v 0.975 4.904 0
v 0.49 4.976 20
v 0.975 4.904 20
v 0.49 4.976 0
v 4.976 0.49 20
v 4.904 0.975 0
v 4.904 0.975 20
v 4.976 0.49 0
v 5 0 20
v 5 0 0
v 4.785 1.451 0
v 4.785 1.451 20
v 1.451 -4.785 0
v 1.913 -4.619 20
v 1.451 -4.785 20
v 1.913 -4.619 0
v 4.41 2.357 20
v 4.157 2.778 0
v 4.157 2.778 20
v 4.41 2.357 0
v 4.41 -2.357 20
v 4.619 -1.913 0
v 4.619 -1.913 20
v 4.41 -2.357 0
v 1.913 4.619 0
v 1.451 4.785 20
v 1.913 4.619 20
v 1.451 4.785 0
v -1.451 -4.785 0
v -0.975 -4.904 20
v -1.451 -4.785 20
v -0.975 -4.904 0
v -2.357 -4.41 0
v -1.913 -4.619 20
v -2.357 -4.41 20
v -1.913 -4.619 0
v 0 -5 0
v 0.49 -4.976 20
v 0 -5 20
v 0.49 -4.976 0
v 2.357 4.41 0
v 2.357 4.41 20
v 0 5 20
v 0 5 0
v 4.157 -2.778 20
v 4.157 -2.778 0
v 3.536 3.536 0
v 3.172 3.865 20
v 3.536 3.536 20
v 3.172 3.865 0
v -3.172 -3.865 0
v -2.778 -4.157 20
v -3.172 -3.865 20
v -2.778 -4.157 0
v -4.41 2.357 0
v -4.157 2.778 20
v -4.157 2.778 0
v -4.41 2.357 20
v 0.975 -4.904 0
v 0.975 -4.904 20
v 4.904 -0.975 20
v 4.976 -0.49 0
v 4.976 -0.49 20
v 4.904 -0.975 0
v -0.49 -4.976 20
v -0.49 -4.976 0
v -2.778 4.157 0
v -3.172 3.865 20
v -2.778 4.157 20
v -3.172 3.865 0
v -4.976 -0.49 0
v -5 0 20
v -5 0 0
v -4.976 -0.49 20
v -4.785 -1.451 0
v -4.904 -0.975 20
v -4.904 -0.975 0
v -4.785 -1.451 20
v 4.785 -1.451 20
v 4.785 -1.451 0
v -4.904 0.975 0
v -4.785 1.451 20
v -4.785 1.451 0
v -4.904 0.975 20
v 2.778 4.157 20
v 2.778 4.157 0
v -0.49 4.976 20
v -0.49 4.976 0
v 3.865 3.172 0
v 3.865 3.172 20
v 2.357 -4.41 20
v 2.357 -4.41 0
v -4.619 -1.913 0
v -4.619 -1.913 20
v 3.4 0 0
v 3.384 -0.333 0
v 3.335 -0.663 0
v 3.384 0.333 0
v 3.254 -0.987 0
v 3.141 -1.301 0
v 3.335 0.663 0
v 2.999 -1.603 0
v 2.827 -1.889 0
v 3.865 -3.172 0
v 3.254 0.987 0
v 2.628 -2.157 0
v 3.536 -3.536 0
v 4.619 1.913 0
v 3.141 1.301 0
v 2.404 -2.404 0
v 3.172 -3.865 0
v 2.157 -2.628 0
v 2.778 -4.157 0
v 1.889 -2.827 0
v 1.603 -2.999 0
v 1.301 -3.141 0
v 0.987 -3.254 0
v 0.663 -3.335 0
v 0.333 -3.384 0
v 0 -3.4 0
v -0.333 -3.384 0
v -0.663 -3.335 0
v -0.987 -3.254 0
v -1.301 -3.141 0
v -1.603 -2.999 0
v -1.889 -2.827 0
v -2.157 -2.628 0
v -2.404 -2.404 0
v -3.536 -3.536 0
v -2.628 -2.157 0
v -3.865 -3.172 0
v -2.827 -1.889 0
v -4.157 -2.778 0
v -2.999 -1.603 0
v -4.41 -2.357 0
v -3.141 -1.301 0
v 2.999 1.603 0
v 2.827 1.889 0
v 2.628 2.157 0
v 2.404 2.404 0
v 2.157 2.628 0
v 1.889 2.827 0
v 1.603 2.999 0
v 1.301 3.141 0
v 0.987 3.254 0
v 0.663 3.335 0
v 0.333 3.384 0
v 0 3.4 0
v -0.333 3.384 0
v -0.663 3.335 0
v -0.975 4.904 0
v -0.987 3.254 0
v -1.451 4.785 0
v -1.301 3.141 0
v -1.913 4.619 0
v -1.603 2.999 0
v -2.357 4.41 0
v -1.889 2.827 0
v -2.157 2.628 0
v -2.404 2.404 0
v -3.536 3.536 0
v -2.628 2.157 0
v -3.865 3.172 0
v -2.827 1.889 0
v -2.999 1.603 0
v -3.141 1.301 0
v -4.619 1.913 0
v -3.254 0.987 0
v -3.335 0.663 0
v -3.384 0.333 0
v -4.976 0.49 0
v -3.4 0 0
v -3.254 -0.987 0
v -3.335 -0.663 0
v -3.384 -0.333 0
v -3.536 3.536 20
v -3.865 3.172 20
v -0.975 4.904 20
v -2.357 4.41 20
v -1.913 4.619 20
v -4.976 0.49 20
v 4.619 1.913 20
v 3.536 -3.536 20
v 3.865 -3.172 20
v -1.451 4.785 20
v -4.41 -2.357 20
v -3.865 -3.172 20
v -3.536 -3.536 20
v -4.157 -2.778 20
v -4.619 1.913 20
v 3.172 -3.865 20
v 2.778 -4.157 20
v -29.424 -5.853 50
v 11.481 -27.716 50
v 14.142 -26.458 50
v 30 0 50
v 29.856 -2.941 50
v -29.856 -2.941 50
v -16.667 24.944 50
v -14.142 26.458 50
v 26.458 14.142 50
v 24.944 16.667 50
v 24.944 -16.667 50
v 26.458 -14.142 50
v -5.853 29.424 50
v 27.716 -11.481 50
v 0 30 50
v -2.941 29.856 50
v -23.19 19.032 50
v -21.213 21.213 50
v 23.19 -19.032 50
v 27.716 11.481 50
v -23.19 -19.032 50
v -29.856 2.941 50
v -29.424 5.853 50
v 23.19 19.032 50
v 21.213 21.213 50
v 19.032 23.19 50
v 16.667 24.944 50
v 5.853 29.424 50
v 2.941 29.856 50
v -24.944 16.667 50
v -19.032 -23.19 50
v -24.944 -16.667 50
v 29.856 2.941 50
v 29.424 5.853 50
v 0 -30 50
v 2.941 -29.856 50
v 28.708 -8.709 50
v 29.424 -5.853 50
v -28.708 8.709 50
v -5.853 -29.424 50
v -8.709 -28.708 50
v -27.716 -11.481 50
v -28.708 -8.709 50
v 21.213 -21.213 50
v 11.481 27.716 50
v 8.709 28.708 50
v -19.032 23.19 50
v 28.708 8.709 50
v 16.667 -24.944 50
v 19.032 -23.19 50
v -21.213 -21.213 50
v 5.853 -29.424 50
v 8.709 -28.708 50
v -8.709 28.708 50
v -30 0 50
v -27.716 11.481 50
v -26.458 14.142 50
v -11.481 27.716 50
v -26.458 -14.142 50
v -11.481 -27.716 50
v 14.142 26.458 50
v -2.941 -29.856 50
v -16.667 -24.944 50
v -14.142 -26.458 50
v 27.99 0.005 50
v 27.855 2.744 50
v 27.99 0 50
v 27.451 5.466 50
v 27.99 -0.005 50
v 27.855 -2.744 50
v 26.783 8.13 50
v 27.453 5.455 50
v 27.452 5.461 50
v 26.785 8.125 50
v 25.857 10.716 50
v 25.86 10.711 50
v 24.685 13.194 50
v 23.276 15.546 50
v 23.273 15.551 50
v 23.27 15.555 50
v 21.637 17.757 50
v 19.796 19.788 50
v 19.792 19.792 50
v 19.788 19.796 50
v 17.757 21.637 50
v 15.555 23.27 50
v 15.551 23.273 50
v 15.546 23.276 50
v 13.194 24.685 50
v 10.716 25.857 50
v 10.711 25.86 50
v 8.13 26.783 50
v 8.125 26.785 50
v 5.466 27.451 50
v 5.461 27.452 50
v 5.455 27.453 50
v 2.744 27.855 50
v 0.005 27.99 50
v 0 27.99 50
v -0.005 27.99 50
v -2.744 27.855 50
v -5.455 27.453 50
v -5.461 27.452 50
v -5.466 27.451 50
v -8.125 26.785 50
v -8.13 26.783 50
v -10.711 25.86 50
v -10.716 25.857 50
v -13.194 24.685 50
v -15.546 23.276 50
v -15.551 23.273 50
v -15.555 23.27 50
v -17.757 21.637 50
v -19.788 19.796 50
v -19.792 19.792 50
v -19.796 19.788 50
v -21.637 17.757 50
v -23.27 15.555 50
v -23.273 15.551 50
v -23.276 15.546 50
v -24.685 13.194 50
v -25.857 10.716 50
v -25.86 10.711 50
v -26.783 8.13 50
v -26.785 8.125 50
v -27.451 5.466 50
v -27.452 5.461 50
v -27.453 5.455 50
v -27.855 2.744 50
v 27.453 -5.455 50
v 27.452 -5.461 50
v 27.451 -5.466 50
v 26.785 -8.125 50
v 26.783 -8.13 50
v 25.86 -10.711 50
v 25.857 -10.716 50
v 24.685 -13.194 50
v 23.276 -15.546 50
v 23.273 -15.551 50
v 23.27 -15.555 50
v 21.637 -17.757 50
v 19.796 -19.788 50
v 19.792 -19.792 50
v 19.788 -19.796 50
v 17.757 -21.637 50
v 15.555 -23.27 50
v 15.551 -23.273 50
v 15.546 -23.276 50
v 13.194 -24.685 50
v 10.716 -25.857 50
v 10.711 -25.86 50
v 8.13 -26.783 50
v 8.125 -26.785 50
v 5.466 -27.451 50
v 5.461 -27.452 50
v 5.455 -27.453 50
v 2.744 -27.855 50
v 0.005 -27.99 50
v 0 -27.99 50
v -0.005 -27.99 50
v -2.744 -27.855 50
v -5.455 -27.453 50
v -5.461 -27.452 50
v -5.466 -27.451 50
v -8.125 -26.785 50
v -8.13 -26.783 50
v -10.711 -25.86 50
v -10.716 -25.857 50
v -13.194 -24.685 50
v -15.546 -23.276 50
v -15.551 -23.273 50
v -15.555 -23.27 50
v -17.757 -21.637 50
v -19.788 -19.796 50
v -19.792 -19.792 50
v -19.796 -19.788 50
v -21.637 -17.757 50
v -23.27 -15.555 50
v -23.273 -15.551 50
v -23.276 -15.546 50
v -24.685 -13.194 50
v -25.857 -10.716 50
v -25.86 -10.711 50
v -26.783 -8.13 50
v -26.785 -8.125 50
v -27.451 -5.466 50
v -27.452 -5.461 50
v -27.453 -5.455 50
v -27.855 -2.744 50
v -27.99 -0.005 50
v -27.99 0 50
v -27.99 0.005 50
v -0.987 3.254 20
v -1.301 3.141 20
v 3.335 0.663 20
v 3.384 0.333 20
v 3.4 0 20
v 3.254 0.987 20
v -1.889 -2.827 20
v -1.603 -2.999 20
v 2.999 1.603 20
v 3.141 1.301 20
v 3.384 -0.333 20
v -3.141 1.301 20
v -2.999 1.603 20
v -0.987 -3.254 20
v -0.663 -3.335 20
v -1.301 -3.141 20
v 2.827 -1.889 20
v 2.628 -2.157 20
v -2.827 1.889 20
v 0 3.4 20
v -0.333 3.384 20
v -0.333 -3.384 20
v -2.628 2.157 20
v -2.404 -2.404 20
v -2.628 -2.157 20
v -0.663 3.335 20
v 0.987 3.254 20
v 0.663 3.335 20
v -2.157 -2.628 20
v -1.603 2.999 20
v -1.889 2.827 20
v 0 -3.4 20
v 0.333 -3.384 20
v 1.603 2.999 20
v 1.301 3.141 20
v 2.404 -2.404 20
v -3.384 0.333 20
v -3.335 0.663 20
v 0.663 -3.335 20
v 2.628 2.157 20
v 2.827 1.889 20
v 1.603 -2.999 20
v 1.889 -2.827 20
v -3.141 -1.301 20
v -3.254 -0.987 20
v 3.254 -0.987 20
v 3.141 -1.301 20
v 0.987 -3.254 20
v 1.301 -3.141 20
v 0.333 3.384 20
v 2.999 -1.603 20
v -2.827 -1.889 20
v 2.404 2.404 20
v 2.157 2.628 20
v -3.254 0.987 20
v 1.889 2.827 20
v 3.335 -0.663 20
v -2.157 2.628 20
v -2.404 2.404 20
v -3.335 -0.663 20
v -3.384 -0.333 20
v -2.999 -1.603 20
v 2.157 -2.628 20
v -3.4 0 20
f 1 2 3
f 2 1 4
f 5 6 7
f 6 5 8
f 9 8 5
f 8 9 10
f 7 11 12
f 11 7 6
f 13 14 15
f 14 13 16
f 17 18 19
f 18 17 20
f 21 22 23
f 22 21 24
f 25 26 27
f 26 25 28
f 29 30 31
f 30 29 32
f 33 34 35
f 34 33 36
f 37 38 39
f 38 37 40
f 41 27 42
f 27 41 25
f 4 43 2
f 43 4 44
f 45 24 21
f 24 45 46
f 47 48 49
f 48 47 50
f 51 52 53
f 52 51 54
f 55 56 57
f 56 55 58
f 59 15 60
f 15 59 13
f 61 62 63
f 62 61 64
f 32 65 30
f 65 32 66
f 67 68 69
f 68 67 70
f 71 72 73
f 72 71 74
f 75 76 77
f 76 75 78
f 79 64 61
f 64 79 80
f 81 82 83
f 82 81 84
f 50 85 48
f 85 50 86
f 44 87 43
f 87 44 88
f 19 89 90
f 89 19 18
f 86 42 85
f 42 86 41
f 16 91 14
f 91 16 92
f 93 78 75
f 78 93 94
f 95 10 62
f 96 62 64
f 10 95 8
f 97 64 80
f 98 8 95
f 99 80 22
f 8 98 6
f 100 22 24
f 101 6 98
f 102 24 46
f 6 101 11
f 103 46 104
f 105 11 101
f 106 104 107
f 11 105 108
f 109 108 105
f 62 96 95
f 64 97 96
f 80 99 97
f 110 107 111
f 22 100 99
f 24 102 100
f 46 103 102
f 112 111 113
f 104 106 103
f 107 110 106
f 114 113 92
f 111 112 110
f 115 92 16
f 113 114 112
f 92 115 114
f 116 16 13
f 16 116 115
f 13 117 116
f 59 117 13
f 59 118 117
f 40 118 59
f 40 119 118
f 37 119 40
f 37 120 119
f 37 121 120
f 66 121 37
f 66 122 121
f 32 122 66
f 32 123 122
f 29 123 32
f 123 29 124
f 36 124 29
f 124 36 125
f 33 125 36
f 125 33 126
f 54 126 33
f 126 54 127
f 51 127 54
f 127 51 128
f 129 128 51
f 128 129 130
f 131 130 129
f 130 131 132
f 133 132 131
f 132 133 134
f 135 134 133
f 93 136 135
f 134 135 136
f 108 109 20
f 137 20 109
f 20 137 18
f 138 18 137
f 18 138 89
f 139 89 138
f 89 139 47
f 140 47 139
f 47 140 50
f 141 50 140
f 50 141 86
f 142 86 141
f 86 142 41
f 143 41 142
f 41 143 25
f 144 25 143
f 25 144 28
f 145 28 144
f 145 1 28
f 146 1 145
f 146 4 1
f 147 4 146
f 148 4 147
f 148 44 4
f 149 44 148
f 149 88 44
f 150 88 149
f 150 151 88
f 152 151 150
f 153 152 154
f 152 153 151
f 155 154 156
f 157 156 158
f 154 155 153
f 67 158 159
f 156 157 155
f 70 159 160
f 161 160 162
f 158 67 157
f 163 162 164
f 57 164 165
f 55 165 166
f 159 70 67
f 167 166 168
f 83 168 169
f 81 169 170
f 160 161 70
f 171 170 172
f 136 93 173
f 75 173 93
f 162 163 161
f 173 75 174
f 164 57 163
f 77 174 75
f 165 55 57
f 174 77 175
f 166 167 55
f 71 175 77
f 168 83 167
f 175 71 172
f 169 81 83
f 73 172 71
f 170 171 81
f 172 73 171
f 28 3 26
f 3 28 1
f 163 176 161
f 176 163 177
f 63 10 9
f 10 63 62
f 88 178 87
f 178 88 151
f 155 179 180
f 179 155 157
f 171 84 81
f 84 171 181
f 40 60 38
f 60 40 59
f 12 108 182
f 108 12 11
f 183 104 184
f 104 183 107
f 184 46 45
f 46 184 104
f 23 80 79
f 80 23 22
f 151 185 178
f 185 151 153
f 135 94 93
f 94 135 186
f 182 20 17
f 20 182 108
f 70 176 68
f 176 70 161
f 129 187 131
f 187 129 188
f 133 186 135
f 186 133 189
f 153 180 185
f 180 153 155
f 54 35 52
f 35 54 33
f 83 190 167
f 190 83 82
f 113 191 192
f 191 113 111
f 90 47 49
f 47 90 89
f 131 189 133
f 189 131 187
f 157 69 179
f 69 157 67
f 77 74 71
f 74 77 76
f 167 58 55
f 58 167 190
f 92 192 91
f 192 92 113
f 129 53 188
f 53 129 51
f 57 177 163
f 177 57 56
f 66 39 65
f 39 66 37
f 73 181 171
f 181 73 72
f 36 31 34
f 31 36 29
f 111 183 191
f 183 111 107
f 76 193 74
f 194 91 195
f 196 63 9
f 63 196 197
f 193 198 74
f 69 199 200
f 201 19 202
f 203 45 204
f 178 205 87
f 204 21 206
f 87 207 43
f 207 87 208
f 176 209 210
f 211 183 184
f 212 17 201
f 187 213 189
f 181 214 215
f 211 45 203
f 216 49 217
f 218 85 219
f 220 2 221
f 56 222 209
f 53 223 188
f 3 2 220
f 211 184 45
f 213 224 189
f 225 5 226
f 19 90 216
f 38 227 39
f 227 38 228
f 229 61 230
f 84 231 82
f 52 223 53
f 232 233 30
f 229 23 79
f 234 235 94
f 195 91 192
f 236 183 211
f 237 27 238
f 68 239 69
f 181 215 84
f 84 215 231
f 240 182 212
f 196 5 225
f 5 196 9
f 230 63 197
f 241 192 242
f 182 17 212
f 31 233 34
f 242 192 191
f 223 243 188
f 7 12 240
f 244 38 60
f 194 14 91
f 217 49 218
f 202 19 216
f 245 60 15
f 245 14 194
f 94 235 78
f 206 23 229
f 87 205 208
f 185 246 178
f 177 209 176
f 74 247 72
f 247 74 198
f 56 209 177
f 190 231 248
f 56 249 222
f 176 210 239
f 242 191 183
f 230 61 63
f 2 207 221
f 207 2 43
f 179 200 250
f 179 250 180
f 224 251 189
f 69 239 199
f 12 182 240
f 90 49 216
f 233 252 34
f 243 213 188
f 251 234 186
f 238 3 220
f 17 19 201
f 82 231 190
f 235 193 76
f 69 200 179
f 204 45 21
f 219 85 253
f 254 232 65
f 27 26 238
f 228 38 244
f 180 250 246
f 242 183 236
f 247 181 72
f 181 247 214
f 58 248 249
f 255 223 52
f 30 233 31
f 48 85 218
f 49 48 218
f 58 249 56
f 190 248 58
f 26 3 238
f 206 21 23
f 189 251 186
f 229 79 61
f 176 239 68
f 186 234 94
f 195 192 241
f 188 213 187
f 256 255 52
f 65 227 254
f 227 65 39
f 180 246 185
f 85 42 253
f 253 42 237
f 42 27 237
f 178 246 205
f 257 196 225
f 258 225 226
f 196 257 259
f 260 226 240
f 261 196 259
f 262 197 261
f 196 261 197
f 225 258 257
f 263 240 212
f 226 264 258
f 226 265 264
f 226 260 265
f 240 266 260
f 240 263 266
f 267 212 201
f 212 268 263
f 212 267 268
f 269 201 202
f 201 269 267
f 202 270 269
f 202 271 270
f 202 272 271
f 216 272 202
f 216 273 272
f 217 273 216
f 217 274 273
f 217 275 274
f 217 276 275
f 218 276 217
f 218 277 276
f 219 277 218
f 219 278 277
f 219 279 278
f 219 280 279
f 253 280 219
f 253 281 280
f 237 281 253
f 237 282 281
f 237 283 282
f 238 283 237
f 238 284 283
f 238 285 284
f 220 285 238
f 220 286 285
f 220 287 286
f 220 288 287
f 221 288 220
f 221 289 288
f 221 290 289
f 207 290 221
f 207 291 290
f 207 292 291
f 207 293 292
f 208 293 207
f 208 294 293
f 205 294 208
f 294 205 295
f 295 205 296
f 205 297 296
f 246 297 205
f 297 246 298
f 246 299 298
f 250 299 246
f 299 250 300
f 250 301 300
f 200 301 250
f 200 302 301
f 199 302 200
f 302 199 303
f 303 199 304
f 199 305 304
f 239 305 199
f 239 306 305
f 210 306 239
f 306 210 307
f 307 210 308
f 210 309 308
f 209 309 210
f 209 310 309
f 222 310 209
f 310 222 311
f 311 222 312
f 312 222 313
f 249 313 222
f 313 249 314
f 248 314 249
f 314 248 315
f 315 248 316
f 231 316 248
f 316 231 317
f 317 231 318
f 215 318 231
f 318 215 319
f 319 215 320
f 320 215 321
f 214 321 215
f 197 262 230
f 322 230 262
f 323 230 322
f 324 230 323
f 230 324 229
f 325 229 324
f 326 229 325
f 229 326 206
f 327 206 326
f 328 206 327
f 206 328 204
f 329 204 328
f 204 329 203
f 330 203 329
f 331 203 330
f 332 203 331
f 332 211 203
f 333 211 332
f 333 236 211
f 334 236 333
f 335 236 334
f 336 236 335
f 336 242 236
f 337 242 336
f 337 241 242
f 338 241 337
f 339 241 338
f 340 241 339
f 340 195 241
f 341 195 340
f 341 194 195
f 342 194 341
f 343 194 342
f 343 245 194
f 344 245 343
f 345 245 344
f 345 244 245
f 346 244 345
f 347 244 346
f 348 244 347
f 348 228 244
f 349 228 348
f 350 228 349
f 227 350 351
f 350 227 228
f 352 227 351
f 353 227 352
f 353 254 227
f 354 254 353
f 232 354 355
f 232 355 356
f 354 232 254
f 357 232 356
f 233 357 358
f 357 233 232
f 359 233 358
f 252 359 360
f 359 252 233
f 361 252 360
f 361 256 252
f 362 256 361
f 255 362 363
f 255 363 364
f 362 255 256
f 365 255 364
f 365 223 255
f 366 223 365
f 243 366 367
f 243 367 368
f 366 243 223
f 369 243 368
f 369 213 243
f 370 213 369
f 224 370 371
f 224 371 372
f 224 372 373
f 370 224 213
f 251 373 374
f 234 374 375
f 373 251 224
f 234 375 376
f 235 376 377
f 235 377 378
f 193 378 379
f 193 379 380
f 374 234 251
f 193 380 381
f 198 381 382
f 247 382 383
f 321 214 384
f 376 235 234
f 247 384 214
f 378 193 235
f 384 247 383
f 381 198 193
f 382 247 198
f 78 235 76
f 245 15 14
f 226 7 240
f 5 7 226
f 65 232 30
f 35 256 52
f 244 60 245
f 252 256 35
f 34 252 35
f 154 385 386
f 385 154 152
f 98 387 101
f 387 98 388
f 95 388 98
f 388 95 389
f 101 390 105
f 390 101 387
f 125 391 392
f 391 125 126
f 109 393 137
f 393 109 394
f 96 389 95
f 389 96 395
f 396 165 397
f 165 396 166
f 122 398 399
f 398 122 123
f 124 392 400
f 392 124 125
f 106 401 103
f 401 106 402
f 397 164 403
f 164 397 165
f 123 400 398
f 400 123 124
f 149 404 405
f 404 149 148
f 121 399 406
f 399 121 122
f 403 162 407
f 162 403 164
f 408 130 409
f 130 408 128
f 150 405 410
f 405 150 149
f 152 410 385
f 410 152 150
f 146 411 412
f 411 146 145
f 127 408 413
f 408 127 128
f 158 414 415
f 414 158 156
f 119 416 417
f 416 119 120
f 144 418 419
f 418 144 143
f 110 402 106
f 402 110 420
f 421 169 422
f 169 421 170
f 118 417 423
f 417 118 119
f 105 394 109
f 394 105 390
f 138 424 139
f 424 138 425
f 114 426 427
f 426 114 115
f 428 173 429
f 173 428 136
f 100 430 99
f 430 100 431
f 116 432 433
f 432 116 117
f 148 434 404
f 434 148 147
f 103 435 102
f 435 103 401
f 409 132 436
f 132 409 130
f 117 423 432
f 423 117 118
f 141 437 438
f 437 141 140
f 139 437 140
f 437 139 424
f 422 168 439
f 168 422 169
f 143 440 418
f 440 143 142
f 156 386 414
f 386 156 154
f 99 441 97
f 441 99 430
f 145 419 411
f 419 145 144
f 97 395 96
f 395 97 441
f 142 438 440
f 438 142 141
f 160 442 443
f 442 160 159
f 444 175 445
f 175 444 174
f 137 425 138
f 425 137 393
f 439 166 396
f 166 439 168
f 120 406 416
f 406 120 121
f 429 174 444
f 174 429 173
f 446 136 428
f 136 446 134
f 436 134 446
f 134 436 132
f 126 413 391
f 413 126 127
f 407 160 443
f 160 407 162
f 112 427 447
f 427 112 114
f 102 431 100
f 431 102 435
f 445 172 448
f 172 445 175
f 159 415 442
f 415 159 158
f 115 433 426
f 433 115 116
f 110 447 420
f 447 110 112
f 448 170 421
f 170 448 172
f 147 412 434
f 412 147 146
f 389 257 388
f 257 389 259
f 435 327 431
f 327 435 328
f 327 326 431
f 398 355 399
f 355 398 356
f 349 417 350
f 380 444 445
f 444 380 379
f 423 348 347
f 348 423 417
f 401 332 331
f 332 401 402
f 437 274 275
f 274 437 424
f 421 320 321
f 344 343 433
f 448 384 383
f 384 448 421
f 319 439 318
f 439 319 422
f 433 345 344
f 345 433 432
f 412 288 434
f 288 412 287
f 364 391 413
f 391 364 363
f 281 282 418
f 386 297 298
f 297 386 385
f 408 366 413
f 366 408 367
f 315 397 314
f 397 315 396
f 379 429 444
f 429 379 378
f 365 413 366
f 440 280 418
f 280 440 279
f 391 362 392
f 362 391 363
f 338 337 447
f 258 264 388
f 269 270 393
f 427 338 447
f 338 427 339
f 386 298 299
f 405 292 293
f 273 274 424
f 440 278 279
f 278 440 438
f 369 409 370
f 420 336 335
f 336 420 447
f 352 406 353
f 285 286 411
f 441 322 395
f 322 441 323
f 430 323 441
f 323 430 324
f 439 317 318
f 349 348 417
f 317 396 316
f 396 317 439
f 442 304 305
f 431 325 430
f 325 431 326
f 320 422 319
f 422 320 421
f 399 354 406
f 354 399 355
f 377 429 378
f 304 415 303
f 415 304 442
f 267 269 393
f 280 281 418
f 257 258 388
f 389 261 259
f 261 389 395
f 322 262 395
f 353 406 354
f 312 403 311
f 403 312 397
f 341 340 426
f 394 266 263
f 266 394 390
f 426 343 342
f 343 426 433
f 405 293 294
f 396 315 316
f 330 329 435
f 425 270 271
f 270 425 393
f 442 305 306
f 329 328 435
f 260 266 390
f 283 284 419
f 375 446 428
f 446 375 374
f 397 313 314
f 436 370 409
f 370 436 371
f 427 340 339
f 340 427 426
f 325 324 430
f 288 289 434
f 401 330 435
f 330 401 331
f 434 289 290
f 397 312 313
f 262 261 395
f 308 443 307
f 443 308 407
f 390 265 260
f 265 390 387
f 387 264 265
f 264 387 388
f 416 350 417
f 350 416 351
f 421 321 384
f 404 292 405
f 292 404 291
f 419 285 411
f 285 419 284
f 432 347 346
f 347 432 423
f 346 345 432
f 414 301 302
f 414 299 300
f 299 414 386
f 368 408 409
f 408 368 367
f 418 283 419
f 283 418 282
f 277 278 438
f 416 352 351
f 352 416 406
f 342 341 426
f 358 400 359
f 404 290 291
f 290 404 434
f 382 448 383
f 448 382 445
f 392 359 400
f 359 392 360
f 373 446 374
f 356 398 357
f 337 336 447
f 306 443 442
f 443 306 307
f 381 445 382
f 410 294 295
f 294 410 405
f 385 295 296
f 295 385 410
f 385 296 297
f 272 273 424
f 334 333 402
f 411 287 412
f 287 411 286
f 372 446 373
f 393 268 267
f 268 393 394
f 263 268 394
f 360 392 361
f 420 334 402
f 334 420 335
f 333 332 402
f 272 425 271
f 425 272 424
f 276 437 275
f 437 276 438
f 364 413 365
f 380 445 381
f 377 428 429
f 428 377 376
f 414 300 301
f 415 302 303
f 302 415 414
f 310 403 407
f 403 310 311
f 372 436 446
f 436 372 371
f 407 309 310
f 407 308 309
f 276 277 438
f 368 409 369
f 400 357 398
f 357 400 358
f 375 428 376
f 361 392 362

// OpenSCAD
// Lab funnel - printed upright, open at top and bottom
$fn = 64;

// --- Dimensions (mm) ---
spout_od      = 10;    // spout outer diameter
spout_id      = spout_od - 2 * 1.6;  // spout bore (6.8)
spout_h       = 20;    // spout height (z = 0 to 20)
cone_bottom_d = spout_od;   // cone starts at spout diameter
cone_top_d    = 60;    // cone rim diameter
cone_h        = 30;    // cone height (z = 20 to 50)
wall          = 1.6;   // uniform wall thickness
eps           = 0.5;   // cutter overshoot

difference() {
    union() {
        // Spout
        cylinder(d = spout_od, h = spout_h);
        // Cone
        translate([0, 0, spout_h])
            cylinder(d1 = cone_bottom_d, d2 = cone_top_d, h = cone_h);
    }
    // Bottom hole through spout
    translate([0, 0, -eps])
        cylinder(d = spout_id, h = spout_h + 2 * eps);
    // Cone bore, extended past the rim
    translate([0, 0, spout_h])
        cylinder(d1 = spout_id, d2 = cone_top_d - 2 * wall, h = cone_h + eps);
}
